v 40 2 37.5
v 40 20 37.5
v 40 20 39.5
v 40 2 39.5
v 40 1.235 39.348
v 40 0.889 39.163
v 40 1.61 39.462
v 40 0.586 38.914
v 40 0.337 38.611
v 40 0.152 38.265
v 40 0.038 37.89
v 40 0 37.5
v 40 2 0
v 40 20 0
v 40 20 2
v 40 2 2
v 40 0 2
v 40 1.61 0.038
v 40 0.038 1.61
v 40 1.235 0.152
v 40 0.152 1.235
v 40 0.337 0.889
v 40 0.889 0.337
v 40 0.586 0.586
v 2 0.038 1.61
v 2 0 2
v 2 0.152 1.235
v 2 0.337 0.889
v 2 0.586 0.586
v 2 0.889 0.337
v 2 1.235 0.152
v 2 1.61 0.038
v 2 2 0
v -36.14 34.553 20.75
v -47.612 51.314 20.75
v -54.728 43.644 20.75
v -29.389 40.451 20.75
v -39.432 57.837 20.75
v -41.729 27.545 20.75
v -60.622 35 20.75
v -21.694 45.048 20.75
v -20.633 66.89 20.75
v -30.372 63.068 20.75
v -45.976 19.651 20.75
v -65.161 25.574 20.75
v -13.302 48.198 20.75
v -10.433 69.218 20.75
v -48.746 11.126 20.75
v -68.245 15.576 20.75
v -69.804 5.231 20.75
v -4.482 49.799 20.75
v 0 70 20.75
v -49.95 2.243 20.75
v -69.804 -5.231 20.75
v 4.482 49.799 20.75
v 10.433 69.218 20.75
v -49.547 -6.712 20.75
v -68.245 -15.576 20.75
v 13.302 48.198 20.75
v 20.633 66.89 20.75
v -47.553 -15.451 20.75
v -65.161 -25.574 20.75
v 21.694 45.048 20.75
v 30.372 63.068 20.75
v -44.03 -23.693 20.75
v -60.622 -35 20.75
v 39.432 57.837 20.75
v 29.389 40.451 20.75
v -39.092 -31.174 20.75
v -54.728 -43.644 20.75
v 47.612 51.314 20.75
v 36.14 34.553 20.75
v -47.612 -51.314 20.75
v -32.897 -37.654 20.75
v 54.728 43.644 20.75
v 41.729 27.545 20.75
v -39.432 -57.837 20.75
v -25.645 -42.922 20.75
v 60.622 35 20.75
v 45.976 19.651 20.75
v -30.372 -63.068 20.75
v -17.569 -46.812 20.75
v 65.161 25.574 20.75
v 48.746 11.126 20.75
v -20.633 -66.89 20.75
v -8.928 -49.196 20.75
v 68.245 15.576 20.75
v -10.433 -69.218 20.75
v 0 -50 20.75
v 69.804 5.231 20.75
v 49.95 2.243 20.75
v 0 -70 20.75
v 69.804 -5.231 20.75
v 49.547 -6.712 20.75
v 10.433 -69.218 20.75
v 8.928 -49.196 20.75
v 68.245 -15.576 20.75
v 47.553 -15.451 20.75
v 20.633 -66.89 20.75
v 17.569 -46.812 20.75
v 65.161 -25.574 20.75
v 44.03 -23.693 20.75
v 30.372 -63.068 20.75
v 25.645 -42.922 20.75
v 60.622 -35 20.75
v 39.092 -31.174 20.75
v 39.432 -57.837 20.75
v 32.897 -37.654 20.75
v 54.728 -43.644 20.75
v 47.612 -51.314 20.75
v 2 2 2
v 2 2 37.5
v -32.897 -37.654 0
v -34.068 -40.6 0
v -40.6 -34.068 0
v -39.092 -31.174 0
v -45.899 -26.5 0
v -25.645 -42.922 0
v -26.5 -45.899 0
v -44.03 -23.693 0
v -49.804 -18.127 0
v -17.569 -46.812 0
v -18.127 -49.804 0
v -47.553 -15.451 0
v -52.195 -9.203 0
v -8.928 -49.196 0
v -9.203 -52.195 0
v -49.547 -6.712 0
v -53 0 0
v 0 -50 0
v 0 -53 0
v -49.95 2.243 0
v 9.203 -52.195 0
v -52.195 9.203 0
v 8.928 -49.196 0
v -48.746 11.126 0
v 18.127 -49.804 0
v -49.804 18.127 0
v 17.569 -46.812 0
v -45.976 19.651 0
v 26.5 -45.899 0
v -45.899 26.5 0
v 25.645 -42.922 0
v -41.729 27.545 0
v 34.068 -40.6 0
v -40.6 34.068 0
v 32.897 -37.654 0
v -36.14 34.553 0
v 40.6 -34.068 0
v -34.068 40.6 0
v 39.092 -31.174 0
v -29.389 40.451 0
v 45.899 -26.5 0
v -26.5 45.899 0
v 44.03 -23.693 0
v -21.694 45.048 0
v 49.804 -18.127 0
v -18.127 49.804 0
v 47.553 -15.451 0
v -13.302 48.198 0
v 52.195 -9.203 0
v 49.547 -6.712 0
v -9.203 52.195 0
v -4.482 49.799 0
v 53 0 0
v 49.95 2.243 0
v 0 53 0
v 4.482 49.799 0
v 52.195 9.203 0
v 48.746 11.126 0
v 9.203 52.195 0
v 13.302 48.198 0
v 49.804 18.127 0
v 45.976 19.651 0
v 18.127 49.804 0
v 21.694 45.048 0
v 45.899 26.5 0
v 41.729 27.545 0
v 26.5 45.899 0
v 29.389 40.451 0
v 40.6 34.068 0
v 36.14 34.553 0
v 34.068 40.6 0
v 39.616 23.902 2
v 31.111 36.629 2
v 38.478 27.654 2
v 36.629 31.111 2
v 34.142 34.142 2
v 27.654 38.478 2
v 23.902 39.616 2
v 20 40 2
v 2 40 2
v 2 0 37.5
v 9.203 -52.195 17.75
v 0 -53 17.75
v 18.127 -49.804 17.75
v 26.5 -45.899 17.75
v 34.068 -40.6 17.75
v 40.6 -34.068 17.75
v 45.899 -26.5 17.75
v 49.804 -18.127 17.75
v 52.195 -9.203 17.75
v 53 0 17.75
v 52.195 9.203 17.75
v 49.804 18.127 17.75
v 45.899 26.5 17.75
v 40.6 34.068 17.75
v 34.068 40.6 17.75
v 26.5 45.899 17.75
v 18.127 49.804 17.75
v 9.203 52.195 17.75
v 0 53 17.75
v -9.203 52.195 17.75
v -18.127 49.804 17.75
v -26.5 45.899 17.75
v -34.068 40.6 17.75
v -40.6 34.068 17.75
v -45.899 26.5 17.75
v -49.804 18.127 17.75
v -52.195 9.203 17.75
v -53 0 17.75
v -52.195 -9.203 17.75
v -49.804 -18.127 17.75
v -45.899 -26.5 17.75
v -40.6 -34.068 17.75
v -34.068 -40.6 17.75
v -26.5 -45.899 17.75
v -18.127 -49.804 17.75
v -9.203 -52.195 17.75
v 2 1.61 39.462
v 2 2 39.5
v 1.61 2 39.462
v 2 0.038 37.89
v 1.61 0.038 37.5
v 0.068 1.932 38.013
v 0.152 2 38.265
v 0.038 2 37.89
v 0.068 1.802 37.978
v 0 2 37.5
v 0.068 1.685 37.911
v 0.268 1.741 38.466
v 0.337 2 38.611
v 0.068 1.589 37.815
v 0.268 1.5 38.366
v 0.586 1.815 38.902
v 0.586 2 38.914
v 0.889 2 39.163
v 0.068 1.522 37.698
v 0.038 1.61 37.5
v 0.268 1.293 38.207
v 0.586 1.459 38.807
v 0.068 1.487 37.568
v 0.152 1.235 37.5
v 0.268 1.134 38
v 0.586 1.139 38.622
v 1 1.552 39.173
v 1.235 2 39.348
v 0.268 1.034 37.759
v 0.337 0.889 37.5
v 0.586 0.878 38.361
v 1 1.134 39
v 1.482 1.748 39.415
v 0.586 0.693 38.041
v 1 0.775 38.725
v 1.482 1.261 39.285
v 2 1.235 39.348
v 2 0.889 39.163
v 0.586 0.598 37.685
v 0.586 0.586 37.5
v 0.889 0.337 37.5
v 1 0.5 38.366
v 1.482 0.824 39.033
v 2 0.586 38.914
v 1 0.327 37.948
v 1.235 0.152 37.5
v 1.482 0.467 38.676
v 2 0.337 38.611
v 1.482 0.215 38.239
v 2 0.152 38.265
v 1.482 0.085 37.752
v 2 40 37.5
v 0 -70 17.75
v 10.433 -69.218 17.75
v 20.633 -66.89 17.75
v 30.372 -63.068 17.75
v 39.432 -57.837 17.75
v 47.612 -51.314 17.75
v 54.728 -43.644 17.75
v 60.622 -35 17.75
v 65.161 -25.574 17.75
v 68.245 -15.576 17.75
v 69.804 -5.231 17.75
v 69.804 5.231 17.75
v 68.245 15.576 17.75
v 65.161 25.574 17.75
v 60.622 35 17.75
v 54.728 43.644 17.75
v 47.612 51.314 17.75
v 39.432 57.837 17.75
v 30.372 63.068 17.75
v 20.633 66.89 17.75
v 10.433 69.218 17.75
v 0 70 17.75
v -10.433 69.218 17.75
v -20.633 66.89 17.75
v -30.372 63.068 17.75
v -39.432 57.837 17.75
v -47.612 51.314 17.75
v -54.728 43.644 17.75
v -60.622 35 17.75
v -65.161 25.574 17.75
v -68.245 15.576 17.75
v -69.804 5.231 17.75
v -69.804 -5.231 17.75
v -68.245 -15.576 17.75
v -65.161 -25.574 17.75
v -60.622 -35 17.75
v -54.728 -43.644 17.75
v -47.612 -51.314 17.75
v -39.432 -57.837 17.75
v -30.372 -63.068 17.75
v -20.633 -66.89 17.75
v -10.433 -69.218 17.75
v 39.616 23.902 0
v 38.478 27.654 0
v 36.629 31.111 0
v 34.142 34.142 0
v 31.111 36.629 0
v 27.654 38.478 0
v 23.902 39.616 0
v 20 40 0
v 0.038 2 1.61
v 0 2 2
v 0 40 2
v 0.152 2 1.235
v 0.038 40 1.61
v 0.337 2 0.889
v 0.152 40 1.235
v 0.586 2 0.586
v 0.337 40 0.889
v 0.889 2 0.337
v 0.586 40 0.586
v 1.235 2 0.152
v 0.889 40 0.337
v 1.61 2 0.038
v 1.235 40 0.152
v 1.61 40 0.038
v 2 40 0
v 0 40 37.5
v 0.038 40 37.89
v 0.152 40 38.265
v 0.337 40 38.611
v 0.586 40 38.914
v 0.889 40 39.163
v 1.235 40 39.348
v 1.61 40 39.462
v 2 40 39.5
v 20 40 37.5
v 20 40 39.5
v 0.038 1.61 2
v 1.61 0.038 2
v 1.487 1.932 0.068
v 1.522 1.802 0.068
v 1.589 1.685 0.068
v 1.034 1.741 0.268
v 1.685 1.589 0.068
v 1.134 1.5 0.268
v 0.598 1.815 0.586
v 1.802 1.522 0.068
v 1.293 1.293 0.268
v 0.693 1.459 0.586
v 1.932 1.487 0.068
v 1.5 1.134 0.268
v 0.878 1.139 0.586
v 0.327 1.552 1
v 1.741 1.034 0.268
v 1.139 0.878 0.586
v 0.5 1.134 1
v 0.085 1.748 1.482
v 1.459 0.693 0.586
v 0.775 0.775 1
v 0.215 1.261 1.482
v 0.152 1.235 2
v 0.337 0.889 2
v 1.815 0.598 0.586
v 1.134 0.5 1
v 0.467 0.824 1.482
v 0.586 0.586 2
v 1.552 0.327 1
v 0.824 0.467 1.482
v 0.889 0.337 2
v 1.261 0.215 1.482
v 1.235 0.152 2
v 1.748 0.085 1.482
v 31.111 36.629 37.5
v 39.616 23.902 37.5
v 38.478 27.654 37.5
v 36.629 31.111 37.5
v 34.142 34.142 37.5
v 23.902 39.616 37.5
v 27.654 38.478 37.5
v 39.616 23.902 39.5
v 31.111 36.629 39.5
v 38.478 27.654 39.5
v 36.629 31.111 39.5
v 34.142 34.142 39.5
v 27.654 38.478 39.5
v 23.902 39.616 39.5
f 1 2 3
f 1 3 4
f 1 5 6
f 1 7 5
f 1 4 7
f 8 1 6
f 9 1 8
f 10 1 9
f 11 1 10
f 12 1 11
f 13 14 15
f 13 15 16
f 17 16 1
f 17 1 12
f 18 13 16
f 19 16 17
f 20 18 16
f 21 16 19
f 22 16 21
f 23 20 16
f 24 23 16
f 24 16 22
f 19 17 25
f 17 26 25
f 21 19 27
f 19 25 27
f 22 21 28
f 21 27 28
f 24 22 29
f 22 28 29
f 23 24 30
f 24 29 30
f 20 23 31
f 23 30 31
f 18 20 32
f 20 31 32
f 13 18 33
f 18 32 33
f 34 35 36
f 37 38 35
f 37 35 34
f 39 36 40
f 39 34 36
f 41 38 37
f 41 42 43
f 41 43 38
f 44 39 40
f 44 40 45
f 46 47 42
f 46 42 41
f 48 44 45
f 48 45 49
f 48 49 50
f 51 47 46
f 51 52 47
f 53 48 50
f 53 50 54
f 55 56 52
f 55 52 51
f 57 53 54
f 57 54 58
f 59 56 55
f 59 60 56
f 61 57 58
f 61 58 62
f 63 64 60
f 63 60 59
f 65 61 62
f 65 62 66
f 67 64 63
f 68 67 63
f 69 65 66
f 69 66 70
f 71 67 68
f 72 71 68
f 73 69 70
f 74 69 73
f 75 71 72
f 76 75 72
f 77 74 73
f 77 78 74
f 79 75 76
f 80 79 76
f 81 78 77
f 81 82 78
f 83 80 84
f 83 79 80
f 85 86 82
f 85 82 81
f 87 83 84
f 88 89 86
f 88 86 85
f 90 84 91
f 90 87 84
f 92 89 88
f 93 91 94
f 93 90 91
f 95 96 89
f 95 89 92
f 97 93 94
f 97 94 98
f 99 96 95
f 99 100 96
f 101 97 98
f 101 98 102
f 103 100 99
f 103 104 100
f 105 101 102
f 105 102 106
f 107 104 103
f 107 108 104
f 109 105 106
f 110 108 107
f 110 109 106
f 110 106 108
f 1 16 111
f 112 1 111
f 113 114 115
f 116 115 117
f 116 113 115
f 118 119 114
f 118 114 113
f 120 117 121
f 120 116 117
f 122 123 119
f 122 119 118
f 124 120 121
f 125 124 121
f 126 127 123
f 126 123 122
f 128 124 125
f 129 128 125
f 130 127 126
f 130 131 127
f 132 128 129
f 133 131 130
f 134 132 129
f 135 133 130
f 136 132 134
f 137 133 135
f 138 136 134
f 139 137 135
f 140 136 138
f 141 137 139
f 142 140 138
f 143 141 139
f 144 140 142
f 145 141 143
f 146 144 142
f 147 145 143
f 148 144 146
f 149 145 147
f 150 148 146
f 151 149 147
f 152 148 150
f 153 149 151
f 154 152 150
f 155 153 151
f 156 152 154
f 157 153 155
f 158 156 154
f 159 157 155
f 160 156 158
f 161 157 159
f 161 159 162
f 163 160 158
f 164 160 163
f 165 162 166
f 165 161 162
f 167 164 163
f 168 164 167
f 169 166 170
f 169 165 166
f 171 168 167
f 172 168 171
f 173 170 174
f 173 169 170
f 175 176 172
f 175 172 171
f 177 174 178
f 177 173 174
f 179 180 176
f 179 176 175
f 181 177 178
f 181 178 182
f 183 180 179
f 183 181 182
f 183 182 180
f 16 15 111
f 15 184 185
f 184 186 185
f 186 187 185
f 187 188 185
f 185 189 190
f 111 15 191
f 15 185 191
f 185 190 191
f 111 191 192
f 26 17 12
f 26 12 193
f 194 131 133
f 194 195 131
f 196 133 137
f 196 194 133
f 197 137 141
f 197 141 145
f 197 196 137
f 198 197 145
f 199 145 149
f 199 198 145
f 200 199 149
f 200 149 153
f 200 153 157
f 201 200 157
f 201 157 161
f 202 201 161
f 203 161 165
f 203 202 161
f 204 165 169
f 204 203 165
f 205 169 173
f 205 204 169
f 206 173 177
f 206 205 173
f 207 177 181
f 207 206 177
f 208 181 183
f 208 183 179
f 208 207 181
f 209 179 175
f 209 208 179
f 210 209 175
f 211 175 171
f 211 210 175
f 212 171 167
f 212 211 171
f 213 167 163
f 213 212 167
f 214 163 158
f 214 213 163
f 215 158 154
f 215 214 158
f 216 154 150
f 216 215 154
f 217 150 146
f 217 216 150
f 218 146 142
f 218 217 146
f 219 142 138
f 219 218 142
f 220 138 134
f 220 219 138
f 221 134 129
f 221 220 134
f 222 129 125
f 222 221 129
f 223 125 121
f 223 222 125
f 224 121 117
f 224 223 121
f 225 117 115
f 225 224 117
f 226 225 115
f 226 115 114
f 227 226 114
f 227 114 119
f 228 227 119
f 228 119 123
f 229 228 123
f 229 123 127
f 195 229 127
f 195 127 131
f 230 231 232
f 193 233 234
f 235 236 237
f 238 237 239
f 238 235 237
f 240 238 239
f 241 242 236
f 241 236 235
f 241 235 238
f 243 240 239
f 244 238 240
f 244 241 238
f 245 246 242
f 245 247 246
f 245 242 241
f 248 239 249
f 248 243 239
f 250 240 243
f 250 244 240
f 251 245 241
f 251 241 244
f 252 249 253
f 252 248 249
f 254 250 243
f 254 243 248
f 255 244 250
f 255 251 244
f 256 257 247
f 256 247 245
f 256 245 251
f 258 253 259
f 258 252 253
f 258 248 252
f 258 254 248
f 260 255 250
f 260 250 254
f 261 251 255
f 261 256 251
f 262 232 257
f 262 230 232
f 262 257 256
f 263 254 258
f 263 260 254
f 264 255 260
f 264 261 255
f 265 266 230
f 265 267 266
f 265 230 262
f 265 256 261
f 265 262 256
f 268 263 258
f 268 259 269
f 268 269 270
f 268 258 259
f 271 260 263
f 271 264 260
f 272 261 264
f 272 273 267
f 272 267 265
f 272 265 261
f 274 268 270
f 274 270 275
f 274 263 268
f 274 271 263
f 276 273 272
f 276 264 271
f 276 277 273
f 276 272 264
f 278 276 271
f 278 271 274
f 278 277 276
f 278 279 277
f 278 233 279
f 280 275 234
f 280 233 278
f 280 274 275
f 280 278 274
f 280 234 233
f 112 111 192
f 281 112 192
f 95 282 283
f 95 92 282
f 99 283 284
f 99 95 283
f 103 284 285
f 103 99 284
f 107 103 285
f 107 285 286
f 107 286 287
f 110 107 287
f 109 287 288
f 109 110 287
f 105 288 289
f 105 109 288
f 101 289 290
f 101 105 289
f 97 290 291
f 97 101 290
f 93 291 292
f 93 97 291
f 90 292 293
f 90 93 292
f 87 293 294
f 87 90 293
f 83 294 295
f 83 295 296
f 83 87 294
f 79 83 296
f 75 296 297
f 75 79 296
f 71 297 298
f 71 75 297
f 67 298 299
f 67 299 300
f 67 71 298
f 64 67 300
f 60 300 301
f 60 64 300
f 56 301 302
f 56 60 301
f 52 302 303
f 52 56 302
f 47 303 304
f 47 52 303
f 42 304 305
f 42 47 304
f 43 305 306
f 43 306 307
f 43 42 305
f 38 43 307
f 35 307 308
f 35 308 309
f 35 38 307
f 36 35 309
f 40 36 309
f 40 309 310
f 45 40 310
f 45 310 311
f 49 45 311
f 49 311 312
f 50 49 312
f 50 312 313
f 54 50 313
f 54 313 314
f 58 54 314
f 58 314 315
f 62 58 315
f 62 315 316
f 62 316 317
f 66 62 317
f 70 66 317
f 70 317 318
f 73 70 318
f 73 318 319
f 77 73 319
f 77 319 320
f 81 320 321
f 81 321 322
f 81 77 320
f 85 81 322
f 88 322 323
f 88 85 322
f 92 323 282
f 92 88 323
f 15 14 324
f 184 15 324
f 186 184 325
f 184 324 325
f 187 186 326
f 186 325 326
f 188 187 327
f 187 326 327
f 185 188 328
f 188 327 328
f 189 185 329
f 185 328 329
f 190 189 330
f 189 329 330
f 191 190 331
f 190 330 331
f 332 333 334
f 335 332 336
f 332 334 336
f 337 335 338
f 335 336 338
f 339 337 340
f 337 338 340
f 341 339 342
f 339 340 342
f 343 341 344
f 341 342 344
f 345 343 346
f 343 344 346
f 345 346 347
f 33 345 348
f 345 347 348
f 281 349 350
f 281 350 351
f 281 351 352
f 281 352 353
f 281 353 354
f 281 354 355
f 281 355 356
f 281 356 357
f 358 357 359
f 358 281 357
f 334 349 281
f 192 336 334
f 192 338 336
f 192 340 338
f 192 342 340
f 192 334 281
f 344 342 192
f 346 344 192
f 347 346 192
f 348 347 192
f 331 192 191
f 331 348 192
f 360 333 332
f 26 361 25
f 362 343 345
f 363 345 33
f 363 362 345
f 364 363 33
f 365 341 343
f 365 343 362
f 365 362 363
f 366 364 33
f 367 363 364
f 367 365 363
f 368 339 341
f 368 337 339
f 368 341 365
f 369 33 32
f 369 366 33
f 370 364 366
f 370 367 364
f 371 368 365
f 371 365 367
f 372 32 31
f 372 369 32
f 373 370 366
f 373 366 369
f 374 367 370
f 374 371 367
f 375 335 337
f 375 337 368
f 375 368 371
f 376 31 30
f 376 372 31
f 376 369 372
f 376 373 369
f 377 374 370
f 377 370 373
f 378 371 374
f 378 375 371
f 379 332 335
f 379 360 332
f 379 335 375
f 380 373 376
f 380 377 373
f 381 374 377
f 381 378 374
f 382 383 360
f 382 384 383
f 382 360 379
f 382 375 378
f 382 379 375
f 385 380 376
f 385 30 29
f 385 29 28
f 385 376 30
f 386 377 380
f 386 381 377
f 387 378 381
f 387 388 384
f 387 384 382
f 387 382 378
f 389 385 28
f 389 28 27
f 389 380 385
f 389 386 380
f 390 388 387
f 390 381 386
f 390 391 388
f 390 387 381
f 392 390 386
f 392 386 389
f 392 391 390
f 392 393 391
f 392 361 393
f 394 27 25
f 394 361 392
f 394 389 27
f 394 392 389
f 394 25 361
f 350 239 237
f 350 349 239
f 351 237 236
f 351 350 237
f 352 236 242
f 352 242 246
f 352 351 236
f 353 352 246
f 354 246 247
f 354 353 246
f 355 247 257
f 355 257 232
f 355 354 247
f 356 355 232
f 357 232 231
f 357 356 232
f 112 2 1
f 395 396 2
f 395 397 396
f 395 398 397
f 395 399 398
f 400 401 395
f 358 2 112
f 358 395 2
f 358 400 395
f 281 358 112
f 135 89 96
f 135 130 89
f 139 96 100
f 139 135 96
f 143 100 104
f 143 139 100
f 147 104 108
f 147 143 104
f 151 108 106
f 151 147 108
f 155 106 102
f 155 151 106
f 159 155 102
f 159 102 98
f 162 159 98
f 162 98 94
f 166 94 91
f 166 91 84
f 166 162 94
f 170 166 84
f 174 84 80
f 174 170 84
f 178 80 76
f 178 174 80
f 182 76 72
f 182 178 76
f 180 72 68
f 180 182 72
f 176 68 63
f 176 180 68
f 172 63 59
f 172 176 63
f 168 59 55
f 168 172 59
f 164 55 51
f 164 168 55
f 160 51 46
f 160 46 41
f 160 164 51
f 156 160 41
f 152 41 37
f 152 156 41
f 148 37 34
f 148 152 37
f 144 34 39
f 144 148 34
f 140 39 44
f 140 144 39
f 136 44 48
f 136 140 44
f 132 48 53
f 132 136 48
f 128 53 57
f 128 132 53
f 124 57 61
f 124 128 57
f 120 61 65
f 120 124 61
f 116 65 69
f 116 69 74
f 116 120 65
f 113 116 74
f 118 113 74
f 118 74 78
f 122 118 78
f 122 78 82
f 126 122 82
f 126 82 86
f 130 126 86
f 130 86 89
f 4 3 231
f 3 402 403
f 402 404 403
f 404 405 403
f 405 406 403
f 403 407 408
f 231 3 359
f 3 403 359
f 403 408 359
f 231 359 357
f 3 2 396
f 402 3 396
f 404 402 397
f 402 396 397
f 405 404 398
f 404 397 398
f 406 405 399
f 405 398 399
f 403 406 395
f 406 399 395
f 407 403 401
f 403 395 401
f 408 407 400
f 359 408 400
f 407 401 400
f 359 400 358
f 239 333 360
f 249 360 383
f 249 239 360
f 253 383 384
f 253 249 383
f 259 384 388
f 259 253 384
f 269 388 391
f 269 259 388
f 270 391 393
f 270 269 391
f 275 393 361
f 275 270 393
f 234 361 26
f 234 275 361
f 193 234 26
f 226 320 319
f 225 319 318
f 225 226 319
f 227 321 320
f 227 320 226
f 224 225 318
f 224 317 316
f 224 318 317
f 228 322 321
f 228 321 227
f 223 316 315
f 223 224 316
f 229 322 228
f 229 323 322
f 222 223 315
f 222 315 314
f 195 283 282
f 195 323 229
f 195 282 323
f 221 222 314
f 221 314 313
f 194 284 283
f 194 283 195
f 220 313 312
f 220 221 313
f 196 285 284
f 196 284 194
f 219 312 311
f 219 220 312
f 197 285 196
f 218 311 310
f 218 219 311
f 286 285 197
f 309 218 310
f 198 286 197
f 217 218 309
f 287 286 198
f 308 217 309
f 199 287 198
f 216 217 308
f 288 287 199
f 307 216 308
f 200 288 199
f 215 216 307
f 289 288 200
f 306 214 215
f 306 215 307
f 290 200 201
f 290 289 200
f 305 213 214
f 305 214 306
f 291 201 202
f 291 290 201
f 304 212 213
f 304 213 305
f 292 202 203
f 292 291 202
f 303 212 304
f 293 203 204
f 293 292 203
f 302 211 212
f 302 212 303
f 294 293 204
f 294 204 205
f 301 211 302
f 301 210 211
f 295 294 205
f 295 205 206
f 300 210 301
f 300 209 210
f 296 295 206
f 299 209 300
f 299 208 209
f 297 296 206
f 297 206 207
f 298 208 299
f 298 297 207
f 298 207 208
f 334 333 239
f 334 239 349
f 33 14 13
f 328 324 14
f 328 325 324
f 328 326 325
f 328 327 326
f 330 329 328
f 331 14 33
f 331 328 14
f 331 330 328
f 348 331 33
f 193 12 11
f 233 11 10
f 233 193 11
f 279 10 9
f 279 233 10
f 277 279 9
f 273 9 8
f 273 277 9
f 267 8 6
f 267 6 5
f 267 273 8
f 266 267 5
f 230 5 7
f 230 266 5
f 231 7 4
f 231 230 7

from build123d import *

# Parameters (mm, degrees)
PAD_DEPTH   = 39.5
THICKNESS_T = -2
FILLET_R    = 2


with BuildPart() as edge:
    # Sketch → Pad (new body)
    with BuildSketch(Plane.XY):
        with BuildLine():
            Line((0, 0), (0, 40))
            Line((0, 40), (20, 40))
            ThreePointArc((40, 20), (34.142136, 34.142136), (20, 40))
            Line((40, 20), (40, 0))
            Line((40, 0), (0, 0))
        make_face()
    extrude(amount=PAD_DEPTH)

    # Thickness
    thickness_openings = [edge.faces().sort_by_distance(p)[0] for p in [
        (10, 40, 19.75),
        (34.142136, 34.142136, 19.75),
        (40, 10, 19.75),
    ]]
    offset(amount=THICKNESS_T, openings=thickness_openings)

    # Fillet
    fillet_edges = [edge.edges().sort_by_distance(p)[0] for p in [
        (20, 0, 39.5),
        (0, 20, 39.5),
        (0, 0, 19.75),
        (0, 20, 0),
        (20, 0, 0),
    ]]
    fillet(fillet_edges, radius=FILLET_R)


with BuildPart() as hole:
    # Sketch002 → Revolution (revolve)
    with BuildSketch(Plane.YZ):
        Polygon((-53, 0), (-53, 17.75), (-70, 17.75), (-70, 20.75), (-50, 20.75), (-50, 0), align=None)
    revolve(axis=Axis((0, 0, 0), (0, 0, 1)))


solid = Compound([edge.part, hole.part])
